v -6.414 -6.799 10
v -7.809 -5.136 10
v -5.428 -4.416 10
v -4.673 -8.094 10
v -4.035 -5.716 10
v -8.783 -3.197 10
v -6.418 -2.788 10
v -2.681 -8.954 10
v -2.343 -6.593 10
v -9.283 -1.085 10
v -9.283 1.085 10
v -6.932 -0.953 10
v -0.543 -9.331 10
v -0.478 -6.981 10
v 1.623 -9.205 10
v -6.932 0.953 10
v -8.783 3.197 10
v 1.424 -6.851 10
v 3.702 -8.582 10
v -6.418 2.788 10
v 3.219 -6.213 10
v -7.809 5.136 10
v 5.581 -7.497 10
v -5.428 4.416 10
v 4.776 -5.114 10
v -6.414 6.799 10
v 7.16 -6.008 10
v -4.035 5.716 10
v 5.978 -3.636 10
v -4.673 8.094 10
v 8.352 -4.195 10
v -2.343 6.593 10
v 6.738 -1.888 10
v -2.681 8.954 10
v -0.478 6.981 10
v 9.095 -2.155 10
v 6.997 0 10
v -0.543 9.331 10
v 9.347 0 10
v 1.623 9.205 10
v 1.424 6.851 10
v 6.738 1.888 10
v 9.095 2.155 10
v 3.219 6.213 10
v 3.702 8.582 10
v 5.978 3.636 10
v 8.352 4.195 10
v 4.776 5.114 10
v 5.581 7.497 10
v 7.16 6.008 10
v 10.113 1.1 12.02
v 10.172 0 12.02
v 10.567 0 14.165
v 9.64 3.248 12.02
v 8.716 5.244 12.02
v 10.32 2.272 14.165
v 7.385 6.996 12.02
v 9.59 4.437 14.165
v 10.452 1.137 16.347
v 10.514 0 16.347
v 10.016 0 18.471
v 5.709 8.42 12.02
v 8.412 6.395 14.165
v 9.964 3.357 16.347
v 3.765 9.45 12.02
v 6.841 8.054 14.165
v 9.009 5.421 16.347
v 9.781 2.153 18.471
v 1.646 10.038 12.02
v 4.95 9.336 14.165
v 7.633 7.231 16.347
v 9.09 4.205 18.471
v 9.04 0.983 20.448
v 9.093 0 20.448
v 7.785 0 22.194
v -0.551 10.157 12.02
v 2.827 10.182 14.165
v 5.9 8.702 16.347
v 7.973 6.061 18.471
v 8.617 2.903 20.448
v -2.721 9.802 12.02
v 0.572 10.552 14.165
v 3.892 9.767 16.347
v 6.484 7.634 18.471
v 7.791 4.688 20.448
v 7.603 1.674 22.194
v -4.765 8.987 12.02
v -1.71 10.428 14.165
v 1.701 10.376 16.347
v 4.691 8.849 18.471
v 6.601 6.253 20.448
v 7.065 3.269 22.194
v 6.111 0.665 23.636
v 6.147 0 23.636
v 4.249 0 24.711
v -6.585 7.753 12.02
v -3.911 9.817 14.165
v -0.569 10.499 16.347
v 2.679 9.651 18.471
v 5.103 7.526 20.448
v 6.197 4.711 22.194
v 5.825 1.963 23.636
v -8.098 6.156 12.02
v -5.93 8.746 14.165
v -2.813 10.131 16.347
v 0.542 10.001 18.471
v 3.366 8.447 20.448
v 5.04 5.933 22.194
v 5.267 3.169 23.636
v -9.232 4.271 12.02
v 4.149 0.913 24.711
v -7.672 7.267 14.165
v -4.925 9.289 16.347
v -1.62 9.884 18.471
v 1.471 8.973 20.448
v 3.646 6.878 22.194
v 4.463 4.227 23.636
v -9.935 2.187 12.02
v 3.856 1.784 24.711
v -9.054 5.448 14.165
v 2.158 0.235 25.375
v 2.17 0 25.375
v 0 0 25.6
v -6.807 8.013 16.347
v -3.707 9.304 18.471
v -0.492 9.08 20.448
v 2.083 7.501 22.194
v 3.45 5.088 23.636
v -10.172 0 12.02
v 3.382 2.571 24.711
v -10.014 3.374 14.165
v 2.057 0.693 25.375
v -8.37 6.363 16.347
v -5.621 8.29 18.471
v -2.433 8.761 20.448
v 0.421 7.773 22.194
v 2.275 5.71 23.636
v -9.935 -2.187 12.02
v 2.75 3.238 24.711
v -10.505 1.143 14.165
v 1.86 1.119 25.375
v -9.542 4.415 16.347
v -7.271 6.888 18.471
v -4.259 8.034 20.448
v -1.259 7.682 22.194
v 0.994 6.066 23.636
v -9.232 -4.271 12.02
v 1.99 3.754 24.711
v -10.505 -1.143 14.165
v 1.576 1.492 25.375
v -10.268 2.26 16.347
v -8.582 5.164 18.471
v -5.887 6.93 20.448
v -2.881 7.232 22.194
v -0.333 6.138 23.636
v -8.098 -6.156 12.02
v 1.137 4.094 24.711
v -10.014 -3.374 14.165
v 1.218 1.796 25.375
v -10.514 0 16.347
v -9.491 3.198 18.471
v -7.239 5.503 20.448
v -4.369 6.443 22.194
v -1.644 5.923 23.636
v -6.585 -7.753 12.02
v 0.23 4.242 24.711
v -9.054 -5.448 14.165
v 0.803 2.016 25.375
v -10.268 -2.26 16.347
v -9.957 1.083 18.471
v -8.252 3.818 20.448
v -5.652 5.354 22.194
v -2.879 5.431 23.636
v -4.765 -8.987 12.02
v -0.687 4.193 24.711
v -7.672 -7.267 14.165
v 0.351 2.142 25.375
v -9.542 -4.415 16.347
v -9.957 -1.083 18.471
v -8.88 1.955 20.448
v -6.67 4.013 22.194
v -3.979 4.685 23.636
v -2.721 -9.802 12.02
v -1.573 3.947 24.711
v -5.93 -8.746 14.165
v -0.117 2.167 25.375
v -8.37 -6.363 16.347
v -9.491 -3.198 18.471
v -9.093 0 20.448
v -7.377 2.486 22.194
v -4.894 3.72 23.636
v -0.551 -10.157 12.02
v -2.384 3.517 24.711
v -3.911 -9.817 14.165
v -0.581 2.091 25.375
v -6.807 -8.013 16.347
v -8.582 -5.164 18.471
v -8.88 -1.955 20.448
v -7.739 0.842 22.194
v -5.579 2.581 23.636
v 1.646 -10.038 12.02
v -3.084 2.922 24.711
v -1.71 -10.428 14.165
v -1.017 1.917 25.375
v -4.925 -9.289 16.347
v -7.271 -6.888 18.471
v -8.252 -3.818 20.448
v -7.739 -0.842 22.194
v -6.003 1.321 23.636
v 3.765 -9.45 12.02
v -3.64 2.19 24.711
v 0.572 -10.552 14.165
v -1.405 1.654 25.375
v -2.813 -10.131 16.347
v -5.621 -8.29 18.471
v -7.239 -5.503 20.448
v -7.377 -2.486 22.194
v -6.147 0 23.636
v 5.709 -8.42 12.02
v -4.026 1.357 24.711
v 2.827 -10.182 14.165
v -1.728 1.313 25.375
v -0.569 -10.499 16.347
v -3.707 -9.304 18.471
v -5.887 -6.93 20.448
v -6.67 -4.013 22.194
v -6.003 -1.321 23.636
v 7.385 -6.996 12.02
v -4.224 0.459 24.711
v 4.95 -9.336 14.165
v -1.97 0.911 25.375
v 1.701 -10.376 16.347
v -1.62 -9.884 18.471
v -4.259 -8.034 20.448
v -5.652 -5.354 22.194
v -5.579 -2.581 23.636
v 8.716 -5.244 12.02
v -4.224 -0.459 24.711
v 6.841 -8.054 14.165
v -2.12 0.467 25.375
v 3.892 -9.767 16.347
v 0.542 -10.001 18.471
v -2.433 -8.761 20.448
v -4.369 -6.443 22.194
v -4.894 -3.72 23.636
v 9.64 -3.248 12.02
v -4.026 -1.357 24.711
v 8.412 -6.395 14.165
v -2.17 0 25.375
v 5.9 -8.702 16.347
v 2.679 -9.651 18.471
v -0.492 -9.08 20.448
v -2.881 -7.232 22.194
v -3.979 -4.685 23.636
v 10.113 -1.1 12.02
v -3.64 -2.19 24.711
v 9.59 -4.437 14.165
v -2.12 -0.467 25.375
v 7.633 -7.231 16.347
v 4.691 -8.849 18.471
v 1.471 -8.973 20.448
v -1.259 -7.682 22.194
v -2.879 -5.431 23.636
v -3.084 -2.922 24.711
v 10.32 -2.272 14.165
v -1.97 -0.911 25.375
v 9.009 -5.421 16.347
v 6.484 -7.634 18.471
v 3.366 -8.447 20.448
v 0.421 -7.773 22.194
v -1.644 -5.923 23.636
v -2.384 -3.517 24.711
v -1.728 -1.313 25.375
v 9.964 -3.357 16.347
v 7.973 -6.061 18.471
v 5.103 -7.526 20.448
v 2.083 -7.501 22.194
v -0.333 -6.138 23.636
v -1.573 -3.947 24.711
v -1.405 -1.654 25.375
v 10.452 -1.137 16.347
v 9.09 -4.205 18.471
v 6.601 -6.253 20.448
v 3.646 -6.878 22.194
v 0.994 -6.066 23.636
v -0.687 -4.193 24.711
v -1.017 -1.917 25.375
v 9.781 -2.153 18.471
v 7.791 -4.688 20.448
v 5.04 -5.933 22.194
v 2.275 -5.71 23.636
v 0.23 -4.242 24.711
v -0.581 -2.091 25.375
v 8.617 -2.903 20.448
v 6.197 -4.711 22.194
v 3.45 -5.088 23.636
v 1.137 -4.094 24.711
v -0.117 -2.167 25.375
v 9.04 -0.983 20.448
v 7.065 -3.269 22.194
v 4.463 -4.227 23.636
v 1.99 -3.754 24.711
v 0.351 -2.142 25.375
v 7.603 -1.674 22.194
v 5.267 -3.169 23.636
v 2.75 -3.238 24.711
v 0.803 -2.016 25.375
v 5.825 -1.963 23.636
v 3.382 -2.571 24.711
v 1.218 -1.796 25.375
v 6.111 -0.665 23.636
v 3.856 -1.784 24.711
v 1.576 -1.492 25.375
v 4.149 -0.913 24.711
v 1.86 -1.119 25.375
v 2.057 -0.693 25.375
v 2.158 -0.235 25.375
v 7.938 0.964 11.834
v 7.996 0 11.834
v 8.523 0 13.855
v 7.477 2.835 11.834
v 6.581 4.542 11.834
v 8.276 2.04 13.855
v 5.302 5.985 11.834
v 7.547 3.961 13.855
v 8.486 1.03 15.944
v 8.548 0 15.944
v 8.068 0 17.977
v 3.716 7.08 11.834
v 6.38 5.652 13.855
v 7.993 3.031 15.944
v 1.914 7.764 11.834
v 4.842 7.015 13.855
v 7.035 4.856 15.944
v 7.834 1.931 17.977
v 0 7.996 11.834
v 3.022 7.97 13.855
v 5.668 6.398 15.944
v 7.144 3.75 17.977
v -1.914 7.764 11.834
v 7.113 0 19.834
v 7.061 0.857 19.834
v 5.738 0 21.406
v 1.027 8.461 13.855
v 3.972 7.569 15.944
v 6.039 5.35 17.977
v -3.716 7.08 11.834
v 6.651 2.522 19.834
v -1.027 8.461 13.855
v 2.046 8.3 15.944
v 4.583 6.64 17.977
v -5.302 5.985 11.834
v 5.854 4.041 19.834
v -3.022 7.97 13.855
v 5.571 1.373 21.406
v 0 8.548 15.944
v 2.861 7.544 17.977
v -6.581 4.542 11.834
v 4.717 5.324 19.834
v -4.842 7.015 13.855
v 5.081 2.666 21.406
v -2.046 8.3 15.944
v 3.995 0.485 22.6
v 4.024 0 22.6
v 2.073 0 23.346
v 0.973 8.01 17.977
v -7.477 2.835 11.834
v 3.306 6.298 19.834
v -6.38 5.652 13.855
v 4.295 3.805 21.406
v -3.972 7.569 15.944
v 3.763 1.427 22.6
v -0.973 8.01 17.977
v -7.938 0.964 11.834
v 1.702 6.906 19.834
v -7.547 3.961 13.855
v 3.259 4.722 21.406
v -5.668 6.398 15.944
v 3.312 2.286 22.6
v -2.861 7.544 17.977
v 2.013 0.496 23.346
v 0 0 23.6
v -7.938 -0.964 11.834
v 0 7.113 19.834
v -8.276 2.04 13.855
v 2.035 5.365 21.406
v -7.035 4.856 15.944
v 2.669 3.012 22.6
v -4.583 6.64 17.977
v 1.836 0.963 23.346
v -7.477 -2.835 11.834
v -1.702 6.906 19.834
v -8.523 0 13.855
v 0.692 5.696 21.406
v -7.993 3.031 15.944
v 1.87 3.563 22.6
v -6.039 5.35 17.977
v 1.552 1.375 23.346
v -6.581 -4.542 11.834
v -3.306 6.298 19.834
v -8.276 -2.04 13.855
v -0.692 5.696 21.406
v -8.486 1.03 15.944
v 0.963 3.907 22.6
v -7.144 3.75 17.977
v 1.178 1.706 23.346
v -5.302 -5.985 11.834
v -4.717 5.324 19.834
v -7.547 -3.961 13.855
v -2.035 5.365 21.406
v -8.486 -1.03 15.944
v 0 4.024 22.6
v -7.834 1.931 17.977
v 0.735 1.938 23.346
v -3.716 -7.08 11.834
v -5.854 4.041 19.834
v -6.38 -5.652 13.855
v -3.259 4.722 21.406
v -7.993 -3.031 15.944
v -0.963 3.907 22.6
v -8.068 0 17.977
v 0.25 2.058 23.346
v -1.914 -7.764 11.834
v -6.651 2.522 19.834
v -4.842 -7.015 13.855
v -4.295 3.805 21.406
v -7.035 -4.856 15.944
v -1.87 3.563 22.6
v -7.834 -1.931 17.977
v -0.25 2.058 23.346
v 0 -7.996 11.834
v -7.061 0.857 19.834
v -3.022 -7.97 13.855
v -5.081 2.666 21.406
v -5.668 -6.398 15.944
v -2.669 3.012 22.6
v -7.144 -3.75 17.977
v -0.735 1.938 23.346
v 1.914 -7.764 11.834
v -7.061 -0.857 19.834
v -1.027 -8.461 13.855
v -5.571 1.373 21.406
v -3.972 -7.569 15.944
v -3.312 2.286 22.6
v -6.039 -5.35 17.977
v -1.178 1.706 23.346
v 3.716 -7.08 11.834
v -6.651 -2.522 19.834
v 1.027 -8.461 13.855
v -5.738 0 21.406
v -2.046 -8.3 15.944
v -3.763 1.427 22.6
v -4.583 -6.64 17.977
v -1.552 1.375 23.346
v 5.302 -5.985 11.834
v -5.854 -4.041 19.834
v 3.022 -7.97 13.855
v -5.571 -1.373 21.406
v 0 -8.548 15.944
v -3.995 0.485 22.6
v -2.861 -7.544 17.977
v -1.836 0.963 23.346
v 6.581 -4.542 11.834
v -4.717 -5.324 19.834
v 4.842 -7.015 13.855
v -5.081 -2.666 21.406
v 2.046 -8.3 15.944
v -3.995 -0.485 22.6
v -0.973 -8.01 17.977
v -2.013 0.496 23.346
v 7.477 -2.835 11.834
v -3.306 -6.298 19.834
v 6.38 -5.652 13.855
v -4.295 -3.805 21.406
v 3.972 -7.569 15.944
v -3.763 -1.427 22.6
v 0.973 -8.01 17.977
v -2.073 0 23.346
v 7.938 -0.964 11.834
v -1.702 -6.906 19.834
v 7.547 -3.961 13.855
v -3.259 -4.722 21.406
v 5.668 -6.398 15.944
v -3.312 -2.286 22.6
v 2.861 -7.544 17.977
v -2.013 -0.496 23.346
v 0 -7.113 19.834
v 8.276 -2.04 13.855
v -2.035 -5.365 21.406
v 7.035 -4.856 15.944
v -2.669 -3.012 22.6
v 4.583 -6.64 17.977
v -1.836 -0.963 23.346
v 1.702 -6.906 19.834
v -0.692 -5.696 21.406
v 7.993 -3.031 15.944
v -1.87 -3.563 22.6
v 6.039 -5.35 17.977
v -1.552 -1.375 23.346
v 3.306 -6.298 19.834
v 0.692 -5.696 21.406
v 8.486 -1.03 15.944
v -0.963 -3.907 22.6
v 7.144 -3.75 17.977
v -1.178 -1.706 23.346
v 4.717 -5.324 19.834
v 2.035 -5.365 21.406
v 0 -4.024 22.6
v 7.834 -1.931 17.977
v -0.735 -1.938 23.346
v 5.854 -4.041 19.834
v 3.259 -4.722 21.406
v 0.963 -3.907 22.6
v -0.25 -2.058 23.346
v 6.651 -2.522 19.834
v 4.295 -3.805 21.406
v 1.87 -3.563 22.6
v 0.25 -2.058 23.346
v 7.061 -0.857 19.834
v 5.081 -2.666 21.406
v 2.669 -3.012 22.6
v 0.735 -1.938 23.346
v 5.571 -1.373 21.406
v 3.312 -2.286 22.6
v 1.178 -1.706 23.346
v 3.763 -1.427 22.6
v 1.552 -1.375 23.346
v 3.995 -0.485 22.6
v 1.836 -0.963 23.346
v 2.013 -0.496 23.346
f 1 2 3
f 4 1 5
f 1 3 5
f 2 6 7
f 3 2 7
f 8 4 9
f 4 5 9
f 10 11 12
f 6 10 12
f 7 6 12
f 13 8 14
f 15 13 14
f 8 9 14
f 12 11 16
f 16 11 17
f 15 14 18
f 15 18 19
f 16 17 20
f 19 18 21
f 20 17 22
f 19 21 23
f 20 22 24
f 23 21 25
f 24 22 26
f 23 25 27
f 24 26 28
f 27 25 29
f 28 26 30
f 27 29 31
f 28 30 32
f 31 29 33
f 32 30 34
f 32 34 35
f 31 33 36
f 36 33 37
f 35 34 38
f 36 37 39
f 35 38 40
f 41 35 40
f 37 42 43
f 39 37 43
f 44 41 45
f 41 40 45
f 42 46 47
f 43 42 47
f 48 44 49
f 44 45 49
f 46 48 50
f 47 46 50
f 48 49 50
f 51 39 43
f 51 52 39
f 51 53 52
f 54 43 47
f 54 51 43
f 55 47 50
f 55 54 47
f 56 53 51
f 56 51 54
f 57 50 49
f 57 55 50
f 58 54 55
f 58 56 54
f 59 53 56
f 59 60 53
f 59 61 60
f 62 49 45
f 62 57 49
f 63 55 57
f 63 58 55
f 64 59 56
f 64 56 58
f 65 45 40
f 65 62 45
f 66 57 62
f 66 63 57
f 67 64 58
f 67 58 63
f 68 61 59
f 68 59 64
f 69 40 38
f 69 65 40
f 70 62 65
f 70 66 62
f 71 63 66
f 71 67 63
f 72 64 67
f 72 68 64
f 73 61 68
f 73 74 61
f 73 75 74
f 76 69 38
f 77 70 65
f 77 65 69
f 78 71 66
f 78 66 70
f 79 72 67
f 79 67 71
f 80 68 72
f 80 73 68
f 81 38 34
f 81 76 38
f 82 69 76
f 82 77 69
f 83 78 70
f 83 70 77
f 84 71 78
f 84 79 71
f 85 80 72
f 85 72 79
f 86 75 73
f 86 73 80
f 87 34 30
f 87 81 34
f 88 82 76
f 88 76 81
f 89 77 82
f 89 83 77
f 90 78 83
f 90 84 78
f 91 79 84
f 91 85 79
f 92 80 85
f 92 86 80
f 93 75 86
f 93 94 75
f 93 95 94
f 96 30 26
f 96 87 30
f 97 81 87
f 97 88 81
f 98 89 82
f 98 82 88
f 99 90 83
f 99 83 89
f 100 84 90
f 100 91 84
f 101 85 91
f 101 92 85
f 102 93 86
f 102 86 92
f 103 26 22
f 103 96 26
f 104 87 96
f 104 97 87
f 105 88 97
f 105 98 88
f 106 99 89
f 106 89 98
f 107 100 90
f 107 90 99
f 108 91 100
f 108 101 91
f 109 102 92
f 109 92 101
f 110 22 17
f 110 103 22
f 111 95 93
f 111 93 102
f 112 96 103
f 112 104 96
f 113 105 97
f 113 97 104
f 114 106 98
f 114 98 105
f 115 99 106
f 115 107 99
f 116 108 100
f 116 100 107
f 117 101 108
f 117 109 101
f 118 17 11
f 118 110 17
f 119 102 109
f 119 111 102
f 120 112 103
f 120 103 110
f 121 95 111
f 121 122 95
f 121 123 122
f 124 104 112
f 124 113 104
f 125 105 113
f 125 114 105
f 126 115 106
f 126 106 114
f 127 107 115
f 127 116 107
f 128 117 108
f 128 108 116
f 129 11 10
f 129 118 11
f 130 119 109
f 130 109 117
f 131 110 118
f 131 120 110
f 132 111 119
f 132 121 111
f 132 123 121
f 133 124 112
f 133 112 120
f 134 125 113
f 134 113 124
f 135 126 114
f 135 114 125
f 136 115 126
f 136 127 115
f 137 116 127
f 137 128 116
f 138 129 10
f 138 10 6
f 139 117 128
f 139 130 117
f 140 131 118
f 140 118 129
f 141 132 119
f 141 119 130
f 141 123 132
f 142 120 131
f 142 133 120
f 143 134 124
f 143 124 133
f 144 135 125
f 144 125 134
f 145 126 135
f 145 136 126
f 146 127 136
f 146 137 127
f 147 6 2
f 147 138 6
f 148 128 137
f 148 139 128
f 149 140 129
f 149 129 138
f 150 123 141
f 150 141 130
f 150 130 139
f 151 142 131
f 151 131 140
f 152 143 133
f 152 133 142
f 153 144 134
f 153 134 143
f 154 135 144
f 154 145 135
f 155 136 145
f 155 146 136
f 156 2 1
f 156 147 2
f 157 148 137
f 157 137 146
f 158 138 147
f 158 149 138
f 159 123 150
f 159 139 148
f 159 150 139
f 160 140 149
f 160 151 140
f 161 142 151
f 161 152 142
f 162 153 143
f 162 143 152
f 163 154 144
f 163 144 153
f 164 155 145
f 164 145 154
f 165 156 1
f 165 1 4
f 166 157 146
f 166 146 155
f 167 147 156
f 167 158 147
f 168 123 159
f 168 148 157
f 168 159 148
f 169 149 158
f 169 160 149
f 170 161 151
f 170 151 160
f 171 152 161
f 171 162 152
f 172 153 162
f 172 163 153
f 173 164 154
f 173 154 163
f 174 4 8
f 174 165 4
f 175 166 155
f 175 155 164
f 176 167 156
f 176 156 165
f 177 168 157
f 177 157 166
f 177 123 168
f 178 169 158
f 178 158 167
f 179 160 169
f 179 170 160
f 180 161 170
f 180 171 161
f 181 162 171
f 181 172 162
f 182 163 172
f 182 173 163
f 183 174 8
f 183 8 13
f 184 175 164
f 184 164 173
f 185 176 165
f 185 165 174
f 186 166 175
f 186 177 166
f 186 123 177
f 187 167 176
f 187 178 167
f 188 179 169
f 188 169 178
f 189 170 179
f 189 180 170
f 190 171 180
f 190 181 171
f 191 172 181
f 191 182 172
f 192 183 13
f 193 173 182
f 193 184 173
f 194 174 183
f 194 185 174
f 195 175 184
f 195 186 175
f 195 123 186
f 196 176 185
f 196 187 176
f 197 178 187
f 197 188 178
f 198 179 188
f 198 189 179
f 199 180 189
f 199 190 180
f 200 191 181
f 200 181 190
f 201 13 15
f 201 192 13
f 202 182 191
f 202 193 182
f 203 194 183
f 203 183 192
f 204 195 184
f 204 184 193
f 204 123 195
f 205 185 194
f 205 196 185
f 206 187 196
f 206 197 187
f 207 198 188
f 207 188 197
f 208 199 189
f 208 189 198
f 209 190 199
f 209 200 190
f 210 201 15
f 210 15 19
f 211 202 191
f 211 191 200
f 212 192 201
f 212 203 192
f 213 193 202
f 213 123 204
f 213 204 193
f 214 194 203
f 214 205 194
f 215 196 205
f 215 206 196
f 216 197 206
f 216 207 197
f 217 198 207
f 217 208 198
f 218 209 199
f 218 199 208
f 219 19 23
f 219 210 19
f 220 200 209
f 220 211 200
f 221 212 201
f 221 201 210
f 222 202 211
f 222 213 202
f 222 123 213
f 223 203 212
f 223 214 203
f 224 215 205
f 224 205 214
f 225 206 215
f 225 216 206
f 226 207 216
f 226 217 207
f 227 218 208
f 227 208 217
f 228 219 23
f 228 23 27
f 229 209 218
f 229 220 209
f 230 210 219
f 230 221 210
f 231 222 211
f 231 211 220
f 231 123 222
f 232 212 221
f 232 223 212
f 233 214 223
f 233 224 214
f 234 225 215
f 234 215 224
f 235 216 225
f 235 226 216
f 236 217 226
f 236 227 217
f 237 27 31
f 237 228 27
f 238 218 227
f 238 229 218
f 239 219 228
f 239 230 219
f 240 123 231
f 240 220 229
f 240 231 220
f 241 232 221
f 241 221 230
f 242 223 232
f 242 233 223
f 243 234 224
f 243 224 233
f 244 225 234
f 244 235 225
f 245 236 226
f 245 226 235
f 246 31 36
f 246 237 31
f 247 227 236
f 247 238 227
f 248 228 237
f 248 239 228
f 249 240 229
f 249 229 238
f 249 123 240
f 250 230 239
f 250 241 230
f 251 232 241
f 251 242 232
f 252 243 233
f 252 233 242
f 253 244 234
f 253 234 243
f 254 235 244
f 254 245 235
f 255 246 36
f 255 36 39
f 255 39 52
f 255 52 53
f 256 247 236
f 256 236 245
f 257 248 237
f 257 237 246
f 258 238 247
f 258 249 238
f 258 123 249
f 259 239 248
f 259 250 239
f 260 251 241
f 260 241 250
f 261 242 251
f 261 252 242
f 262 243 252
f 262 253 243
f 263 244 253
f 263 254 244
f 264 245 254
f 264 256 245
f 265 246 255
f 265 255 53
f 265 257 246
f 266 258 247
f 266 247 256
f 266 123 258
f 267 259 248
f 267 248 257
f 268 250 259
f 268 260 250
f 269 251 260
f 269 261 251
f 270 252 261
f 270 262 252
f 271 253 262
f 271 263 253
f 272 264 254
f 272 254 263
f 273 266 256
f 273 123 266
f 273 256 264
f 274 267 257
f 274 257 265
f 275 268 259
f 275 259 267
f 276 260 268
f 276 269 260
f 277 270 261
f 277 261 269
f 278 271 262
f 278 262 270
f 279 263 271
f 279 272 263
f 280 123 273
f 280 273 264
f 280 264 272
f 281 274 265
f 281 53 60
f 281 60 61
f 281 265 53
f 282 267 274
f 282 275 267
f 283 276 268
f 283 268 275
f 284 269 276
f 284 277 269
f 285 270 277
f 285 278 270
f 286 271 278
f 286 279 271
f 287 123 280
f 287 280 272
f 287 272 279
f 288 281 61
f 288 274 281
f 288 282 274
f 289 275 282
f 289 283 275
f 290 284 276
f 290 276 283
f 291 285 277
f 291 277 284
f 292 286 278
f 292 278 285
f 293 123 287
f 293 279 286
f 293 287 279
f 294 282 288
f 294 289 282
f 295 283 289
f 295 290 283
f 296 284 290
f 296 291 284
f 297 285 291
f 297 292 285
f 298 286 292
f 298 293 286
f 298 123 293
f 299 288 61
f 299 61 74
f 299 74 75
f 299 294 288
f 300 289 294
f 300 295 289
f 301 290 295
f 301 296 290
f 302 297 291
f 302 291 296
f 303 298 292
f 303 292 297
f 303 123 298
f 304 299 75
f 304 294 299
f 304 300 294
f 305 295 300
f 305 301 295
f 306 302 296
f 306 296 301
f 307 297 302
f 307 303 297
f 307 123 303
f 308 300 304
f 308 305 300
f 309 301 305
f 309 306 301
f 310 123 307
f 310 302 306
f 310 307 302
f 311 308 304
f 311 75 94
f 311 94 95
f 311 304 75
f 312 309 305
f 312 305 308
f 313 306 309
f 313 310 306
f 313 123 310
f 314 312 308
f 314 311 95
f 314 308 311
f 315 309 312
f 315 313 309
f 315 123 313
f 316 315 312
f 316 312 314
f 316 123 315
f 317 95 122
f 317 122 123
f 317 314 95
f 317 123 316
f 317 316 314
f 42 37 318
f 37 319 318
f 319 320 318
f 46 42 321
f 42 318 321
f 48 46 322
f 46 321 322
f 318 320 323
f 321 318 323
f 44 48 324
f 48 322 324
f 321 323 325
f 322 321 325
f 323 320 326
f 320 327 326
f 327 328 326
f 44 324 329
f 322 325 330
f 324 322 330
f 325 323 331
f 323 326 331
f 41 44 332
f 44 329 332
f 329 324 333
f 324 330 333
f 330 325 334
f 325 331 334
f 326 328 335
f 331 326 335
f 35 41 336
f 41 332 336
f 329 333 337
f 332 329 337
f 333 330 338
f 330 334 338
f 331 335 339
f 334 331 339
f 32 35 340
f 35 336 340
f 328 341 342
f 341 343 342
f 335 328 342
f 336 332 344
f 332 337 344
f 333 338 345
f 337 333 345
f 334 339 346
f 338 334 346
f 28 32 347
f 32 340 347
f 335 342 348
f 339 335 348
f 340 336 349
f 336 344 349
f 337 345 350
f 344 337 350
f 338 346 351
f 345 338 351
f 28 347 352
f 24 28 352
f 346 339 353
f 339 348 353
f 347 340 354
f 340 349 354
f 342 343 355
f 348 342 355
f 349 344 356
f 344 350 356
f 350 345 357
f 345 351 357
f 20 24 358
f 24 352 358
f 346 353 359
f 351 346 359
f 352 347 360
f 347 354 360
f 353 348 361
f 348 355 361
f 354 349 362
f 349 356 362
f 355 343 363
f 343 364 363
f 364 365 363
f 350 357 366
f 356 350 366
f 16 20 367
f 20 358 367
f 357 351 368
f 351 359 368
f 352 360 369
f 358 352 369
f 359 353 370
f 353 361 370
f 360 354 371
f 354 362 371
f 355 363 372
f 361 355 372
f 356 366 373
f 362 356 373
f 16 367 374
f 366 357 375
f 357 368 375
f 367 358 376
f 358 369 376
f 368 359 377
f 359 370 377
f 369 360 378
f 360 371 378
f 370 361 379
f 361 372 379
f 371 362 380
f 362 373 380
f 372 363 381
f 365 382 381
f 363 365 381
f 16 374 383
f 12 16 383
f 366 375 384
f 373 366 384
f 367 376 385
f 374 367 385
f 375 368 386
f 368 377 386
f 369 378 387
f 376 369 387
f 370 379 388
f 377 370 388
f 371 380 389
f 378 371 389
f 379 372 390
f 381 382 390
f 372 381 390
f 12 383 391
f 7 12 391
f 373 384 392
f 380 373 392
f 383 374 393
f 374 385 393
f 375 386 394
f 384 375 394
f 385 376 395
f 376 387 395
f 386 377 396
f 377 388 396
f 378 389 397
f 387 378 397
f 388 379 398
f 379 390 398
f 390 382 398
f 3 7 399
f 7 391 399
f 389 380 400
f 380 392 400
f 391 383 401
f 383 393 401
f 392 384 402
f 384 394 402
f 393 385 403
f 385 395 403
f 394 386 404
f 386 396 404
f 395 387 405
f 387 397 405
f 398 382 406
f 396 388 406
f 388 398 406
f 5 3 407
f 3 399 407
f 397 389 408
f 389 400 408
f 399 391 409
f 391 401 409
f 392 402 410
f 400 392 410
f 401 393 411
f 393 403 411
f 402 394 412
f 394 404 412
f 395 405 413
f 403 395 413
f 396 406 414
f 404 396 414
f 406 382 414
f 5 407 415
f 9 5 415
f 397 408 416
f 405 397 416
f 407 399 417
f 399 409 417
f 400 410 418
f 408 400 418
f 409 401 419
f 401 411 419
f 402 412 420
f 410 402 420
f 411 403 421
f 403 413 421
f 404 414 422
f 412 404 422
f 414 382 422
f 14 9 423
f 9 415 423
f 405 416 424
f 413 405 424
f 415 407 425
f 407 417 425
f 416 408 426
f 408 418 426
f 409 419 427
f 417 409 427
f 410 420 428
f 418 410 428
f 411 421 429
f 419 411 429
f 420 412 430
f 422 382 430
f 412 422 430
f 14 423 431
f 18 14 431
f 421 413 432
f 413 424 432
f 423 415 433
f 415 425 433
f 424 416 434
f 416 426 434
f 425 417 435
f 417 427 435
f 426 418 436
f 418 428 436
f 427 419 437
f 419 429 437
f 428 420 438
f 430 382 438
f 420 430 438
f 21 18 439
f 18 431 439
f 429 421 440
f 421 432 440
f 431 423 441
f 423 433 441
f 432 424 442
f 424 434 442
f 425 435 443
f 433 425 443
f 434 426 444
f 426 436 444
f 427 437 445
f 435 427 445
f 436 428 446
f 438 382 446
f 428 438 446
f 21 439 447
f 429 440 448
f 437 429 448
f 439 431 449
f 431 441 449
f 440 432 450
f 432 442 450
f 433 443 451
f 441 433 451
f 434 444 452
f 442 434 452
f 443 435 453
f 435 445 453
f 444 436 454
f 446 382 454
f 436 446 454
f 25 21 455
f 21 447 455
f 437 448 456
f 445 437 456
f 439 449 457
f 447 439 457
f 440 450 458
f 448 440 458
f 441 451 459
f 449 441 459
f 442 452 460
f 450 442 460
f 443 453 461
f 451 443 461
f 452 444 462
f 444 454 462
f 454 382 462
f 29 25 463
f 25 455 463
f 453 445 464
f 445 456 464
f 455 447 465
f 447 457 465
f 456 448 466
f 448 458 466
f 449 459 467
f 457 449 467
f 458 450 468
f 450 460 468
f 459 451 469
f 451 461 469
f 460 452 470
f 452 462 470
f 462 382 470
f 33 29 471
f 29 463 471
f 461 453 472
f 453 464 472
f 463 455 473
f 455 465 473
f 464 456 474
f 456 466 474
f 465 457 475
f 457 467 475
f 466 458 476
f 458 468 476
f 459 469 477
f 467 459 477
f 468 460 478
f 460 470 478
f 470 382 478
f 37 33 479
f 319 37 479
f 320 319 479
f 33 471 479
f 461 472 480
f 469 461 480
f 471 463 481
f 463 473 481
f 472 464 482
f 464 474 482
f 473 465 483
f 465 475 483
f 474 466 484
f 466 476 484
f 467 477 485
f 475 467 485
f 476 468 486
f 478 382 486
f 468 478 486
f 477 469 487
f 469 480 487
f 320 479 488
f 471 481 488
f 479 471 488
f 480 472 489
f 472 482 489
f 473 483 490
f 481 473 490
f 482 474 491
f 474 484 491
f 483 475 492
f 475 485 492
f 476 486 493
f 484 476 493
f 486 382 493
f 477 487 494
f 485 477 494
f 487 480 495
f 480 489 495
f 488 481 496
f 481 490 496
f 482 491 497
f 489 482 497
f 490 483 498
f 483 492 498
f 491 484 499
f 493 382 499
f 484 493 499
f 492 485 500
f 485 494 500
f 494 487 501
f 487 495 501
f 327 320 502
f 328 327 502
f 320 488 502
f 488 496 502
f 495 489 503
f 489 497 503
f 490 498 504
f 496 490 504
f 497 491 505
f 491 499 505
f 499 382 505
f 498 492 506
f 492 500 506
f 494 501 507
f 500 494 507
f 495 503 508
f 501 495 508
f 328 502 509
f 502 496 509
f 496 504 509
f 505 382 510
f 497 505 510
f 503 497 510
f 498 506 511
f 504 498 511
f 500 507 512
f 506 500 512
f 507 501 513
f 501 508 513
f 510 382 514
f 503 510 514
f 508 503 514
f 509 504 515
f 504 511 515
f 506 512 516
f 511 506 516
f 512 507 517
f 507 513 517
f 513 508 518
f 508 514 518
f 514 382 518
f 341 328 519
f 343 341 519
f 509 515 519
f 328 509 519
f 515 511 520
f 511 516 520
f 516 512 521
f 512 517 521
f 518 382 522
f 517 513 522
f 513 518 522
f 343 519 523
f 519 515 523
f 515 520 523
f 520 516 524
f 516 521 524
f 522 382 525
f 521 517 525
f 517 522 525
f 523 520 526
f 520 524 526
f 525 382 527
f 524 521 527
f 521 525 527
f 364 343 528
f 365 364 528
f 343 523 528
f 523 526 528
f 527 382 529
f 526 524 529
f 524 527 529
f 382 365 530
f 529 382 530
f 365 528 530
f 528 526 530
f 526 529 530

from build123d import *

# Parameters (mm, degrees)
BOX_W     = 20
BOX_H     = 20
BOX_DEPTH = 9


with BuildPart() as cube:
    # Box → Box (new body)
    with BuildSketch(Plane(origin=(-10, -10, 1), x_dir=(1, 0, 0), z_dir=(0, 0, 1))):
        with Locations((10, 10)):
            Rectangle(BOX_W, BOX_H)
    extrude(amount=BOX_DEPTH)


with BuildPart() as topuz:
    # Sphere → Sphere (revolve)
    with BuildSketch(Plane(origin=(0, 0, 15), x_dir=(1, 0, 0), z_dir=(0, -1, 0))):
        with BuildLine():
            ThreePointArc((0, -8.6), (8.6, 0), (0, 8.6))
            Line((0, 8.6), (0, -8.6))
        make_face()
    revolve(axis=Axis((0, 0, 15), (0, 0, 1)))


with BuildPart() as rouded:
    # Sphere001 → Sphere001 (revolve)
    with BuildSketch(Plane(origin=(0, 0, 15), x_dir=(1, 0, 0), z_dir=(0, -1, 0))):
        with BuildLine():
            ThreePointArc((0, -10.6), (10.6, 0), (0, 10.6))
            Line((0, 10.6), (0, -10.6))
        make_face()
    revolve(axis=Axis((0, 0, 15), (0, 0, 1)))

    # Cut: cut Topuz
    add(topuz.part, mode=Mode.SUBTRACT)

    # Cut001: cut Cube
    add(cube.part, mode=Mode.SUBTRACT)


solid = rouded.part
